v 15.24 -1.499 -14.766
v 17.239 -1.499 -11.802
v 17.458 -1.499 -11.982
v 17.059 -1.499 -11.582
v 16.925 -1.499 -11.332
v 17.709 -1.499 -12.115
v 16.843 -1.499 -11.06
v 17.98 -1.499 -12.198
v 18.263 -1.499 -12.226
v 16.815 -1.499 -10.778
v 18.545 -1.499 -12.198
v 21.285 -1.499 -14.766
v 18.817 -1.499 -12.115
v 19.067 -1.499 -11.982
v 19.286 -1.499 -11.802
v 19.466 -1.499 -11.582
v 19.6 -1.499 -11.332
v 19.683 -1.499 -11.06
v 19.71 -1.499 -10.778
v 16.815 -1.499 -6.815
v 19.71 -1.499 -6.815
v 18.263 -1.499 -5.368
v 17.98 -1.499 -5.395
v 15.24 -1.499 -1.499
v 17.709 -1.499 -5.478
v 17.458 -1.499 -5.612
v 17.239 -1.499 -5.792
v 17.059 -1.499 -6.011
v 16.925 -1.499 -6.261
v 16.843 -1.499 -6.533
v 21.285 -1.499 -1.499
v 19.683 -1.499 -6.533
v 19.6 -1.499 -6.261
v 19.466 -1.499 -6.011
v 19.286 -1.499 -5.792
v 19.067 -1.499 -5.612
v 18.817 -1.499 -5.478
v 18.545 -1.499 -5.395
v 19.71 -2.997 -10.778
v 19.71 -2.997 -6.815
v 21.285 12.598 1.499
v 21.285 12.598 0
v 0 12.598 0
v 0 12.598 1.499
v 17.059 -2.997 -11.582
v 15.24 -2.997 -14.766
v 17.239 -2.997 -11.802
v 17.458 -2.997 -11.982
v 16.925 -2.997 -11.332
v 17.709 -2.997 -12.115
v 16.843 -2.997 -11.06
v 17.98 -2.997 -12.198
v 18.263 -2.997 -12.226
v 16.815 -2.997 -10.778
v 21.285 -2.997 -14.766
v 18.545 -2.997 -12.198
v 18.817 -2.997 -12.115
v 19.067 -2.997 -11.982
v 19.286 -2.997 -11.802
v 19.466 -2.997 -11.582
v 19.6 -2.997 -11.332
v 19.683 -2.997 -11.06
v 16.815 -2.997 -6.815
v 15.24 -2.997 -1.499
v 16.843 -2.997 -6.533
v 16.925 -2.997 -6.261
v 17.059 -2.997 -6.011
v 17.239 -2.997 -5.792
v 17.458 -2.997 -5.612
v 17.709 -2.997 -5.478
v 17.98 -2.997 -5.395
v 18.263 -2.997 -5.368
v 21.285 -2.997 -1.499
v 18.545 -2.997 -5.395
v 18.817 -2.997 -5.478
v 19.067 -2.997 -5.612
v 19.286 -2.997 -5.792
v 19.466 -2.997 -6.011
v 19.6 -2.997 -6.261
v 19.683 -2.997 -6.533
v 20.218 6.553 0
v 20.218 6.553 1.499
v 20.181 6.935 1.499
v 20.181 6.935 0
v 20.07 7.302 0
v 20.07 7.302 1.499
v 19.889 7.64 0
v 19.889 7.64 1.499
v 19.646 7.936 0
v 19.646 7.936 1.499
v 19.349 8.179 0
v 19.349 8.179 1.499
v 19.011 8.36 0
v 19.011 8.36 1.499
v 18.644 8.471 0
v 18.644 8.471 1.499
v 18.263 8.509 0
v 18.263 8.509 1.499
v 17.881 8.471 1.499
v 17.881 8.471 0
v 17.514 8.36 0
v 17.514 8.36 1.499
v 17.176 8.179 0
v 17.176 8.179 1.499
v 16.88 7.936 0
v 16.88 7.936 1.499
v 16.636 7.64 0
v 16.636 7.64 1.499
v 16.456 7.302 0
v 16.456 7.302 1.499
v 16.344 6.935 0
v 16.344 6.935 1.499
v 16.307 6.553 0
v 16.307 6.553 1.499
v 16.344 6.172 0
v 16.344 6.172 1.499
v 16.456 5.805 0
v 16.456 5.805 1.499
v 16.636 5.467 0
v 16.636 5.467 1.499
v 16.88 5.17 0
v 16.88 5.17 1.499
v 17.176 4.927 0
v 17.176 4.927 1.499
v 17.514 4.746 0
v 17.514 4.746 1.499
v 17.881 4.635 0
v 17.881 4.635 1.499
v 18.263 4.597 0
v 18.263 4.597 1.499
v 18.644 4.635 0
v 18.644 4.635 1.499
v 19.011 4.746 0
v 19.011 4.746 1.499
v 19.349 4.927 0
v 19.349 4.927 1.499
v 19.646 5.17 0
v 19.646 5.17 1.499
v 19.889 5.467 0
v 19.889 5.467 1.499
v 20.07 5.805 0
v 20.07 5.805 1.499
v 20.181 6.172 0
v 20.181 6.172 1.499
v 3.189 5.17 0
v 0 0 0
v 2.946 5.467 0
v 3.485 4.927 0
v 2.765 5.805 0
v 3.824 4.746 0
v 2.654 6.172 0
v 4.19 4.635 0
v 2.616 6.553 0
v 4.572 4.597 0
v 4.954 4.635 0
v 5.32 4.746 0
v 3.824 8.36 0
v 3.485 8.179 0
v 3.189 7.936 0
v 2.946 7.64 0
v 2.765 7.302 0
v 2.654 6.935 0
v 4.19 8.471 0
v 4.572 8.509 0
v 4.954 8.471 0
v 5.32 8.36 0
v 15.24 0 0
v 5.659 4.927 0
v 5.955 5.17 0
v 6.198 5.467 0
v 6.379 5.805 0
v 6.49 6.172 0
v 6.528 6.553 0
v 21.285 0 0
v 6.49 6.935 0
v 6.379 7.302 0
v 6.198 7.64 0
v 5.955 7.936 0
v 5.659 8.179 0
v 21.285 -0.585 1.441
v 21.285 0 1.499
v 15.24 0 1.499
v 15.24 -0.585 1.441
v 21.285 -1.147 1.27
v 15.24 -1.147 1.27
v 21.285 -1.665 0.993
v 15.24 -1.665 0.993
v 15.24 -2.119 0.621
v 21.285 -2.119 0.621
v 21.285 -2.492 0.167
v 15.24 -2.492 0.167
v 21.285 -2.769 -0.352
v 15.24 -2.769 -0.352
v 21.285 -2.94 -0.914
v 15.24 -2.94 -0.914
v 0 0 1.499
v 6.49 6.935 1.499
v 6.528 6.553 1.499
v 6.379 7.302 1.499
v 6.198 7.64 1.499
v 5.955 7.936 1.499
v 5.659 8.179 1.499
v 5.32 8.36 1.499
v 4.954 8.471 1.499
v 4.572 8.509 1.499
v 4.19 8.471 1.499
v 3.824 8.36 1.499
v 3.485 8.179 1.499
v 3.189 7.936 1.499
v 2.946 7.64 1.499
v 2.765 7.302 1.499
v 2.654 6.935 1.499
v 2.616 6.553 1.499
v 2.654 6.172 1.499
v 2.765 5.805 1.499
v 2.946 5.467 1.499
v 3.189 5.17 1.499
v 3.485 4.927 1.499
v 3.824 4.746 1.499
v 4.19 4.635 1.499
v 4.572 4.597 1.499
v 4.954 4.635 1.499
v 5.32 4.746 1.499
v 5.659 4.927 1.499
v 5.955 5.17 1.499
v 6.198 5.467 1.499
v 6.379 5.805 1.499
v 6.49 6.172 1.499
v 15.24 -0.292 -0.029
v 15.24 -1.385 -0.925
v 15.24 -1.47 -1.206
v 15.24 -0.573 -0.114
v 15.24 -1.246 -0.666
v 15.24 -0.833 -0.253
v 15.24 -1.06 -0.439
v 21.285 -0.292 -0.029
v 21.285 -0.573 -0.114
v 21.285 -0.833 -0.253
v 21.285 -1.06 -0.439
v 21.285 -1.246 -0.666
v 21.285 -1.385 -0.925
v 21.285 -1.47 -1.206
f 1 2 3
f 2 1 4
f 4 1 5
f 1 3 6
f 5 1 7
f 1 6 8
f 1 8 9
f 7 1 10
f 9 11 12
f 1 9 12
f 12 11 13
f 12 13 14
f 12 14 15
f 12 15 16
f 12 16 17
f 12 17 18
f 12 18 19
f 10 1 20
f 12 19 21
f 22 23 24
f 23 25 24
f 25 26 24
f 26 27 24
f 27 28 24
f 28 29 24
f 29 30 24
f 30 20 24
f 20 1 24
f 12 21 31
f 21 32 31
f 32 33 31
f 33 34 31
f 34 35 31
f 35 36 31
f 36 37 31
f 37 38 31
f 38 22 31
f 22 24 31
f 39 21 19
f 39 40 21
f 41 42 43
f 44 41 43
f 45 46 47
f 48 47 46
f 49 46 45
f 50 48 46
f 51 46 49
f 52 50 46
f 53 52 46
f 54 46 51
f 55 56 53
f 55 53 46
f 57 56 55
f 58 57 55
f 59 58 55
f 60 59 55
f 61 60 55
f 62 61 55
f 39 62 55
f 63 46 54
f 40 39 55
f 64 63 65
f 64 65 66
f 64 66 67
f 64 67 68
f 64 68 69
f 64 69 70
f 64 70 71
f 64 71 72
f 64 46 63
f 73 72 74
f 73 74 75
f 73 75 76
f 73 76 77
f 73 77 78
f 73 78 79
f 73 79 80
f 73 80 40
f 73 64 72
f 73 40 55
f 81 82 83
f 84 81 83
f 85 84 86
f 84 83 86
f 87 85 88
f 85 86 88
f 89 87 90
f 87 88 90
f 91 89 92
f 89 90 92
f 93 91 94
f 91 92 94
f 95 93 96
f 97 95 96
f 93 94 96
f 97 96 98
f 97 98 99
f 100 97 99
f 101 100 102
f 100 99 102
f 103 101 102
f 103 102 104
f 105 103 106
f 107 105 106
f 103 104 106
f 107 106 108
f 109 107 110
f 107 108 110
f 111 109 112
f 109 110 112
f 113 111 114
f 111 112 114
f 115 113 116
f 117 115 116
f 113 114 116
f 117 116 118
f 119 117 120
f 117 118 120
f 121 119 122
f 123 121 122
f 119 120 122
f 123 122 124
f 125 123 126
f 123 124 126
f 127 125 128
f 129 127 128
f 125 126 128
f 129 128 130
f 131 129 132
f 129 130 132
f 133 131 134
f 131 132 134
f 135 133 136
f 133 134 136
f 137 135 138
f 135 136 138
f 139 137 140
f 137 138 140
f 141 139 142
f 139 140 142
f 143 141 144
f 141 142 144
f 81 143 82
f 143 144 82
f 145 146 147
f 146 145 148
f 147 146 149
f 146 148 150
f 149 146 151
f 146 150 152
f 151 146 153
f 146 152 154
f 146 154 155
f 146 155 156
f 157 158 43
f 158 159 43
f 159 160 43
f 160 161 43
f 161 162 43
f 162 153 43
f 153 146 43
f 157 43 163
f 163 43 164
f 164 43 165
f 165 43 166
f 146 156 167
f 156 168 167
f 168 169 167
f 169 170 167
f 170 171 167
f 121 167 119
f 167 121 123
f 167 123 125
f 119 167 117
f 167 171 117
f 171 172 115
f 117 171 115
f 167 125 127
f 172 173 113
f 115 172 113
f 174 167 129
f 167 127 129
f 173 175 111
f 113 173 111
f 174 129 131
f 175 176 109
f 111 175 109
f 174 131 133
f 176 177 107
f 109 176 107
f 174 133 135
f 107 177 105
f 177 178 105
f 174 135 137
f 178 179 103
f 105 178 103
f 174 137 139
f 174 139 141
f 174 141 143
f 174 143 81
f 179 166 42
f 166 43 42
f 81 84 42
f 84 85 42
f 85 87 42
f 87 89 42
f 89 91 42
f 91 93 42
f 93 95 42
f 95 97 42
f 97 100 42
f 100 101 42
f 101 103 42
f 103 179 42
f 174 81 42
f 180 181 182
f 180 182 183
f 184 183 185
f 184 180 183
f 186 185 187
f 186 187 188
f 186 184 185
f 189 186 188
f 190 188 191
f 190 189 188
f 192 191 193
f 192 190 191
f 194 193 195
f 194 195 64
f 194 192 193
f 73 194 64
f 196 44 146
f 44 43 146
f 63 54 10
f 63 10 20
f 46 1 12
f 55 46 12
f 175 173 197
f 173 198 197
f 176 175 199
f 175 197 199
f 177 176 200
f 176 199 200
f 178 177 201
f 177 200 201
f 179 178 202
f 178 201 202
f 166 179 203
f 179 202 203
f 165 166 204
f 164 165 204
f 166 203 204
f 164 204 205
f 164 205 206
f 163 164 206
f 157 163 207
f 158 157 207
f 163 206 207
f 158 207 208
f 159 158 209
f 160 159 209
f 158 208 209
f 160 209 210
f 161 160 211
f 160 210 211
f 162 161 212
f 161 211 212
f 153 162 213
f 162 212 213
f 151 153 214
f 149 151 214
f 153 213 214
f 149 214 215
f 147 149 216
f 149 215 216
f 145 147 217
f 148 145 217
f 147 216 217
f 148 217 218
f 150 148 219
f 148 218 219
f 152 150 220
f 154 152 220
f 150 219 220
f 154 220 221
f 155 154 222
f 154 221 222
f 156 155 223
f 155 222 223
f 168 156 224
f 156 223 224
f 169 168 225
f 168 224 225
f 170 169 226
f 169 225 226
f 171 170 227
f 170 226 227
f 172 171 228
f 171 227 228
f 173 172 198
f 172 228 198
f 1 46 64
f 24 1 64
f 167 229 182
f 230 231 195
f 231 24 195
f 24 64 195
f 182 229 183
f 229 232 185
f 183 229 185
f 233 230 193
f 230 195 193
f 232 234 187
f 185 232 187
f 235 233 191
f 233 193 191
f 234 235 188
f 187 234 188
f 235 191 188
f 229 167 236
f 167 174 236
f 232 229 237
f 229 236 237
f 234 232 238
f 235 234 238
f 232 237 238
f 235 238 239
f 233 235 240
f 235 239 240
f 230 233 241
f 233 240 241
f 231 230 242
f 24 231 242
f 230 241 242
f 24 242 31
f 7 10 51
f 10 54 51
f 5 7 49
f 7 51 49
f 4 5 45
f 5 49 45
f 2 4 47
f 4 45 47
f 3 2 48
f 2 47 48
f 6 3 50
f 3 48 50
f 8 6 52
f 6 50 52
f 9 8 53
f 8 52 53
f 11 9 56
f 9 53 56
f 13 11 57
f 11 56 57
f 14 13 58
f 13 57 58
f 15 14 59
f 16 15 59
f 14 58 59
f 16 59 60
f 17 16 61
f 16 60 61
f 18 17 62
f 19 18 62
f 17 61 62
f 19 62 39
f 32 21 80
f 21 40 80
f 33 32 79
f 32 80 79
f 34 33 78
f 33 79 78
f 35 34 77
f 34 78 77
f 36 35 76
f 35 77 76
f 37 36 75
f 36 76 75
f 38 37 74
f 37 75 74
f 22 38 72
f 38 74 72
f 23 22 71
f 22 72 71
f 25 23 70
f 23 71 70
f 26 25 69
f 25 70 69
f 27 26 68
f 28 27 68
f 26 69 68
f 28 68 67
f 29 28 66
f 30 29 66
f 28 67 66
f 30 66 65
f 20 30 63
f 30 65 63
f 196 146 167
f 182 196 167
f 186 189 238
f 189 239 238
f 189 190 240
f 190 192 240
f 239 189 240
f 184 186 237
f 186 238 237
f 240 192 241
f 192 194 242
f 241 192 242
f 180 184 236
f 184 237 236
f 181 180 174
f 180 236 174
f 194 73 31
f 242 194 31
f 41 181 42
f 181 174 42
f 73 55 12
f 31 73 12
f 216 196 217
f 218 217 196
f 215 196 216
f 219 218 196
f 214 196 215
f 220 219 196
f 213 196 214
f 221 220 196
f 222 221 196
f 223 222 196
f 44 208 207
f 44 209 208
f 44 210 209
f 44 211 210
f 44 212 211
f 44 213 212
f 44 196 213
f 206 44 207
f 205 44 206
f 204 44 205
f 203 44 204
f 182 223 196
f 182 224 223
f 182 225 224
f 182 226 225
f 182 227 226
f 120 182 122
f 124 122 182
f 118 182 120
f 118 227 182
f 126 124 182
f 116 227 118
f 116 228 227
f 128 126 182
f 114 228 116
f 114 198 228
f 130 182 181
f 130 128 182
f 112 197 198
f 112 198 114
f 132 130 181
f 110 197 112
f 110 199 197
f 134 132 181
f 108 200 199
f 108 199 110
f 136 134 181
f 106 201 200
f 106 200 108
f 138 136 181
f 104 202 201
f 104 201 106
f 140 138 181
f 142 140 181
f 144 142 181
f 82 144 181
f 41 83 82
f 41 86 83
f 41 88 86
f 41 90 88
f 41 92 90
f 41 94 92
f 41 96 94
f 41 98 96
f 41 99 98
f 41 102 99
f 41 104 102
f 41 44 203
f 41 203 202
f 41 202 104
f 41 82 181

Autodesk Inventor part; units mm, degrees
ref_plane "YZ Plane" through (0, 0, 0) normal (1, 0, 0) x (0, 1, 0)
ref_plane "XZ Plane" through (0, 0, 0) normal (0, 1, 0) x (-1, 0, 0)
ref_plane "XY Plane" through (0, 0, 0) normal (0, 0, 1) x (1, 0, 0)
sketch "Sketch1" plane through (0, 0, 0) normal (0, 0, 1) x (1, 0, 0)
  line L0 (0, 0) -> (15.24, 0)
  line L1 (21.2852, 0) -> (21.2852, 12.5984)
  line L2 (21.2852, 12.5984) -> (0, 12.5984)
  line L3 (0, 12.5984) -> (0, 0)
  line L4 (15.24, 0) -> (15.24, -15.621)
  line L5 (15.24, -15.621) -> (21.2852, -15.621)
  line L6 (21.2852, -15.621) -> (21.2852, 0)
  line L7 (0, 0) -> (15.24, 0)
  dimension "d0" = 21.2852
  dimension "d1" = 12.5984
  dimension "d2" = 6.0452
  dimension "d3" = 15.621
extrude "Extrusion1" add sketch "Sketch1" along normal blind 1.4986
sketch "Sketch2" plane through (0, 0, 1.4986) normal (0, 0, 1) x (1, 0, 0)
  circle A0 centre (4.572, 6.5532) radius 1.9558
  line L0 (21.2852, 12.5984) -> (0, 12.5984) projected
  line L1 (0, 12.5984) -> (0, 0) projected
  circle A1 centre (18.2626, 6.5532) radius 1.9558
  dimension "d6" = 3.9116
  dimension "d7" = 6.0452
  dimension "d8" = 4.572
  dimension "d11" = 13.6906
extrude "Extrusion2" cut sketch "Sketch2" against normal blind 25.4
sketch "Sketch3" plane through (0, 0, 1.4986) normal (0, 0, 1) x (1, 0, 0)
  circle A0 centre (18.2626, -11.6332) radius 1.4478
  line L0 (15.24, -15.621) -> (21.2852, -15.621) projected
  line L1 (15.24, 0) -> (15.24, -15.621) projected
  circle A1 centre (18.2626, -7.6708) radius 1.4478
  line L2 (16.8148, -7.6708) -> (18.2626, -7.6708)
  line L3 (19.7104, -11.6332) -> (17.1196, -11.6332)
  point P0 (0, 0)
  dimension "d18" = 2.8956
  dimension "d19" = 3.9878
  dimension "d20" = 3.0226
  dimension "d26" = 3.9624
extrude "Extrusion4" cut sketch "Sketch3" against normal blind 25.4
sketch "Sketch6" plane through (0, 0, 1.4986) normal (0, 0, 1) x (1, 0, 0)
  circle A0 centre (18.2626, -7.6708) radius 1.4478 projected
  circle A1 centre (18.2626, -11.6332) radius 1.4478 projected
  line L0 (16.8148, -7.6708) -> (19.7104, -7.6708)
  line L1 (19.7104, -7.6708) -> (19.7104, -11.6332)
  line L2 (19.7104, -11.6332) -> (16.8148, -11.6332)
  line L3 (16.8148, -11.6332) -> (16.8148, -7.6708)
  point P0 (0, 0)
extrude "Extrusion5" cut sketch "Sketch6" against normal blind 25.4 contours L1 A1 L3 A0 | A0 L0 | L2 A1 picked at (18.2044, -8.1499) picked at (18.4337, -11.182)
sketch "Sketch17" plane through (0, 0, 0) normal (0, 0, -1) x (-1, 0, 0)
  line L0 (-21.2852, -15.621) -> (-21.2852, 12.5984) projected
  line L1 (-21.2852, 0) -> (-15.349, 0)
  point P0 (0, 0)
bend part "Bend Part3" radius 1.4986 angle 90 line through (21.2852, 0, 0) along (-1, 0, 0) centre toward (0, 0, -1) moving side (0, -1, 0) both sides no
equation "\"BendRadius\" = Thickness"
equation "\"BendReliefWidth\" = Thickness"
equation "\"BendReliefDepth\" = 0.5 * Thickness"
equation "\"CornerReliefSize\" = 4 * Thickness"
equation "\"MinimumRemnant\" = 2 * Thickness"
equation "\"TransitionRadius\" = BendRadius"
equation "\"JacobiRadiusSize\" = Thickness"
equation "\"GapSize\" = Thickness"
equation "\"Thickness\" = 3.048"
properties part number "dsub37bracket_redraw"
